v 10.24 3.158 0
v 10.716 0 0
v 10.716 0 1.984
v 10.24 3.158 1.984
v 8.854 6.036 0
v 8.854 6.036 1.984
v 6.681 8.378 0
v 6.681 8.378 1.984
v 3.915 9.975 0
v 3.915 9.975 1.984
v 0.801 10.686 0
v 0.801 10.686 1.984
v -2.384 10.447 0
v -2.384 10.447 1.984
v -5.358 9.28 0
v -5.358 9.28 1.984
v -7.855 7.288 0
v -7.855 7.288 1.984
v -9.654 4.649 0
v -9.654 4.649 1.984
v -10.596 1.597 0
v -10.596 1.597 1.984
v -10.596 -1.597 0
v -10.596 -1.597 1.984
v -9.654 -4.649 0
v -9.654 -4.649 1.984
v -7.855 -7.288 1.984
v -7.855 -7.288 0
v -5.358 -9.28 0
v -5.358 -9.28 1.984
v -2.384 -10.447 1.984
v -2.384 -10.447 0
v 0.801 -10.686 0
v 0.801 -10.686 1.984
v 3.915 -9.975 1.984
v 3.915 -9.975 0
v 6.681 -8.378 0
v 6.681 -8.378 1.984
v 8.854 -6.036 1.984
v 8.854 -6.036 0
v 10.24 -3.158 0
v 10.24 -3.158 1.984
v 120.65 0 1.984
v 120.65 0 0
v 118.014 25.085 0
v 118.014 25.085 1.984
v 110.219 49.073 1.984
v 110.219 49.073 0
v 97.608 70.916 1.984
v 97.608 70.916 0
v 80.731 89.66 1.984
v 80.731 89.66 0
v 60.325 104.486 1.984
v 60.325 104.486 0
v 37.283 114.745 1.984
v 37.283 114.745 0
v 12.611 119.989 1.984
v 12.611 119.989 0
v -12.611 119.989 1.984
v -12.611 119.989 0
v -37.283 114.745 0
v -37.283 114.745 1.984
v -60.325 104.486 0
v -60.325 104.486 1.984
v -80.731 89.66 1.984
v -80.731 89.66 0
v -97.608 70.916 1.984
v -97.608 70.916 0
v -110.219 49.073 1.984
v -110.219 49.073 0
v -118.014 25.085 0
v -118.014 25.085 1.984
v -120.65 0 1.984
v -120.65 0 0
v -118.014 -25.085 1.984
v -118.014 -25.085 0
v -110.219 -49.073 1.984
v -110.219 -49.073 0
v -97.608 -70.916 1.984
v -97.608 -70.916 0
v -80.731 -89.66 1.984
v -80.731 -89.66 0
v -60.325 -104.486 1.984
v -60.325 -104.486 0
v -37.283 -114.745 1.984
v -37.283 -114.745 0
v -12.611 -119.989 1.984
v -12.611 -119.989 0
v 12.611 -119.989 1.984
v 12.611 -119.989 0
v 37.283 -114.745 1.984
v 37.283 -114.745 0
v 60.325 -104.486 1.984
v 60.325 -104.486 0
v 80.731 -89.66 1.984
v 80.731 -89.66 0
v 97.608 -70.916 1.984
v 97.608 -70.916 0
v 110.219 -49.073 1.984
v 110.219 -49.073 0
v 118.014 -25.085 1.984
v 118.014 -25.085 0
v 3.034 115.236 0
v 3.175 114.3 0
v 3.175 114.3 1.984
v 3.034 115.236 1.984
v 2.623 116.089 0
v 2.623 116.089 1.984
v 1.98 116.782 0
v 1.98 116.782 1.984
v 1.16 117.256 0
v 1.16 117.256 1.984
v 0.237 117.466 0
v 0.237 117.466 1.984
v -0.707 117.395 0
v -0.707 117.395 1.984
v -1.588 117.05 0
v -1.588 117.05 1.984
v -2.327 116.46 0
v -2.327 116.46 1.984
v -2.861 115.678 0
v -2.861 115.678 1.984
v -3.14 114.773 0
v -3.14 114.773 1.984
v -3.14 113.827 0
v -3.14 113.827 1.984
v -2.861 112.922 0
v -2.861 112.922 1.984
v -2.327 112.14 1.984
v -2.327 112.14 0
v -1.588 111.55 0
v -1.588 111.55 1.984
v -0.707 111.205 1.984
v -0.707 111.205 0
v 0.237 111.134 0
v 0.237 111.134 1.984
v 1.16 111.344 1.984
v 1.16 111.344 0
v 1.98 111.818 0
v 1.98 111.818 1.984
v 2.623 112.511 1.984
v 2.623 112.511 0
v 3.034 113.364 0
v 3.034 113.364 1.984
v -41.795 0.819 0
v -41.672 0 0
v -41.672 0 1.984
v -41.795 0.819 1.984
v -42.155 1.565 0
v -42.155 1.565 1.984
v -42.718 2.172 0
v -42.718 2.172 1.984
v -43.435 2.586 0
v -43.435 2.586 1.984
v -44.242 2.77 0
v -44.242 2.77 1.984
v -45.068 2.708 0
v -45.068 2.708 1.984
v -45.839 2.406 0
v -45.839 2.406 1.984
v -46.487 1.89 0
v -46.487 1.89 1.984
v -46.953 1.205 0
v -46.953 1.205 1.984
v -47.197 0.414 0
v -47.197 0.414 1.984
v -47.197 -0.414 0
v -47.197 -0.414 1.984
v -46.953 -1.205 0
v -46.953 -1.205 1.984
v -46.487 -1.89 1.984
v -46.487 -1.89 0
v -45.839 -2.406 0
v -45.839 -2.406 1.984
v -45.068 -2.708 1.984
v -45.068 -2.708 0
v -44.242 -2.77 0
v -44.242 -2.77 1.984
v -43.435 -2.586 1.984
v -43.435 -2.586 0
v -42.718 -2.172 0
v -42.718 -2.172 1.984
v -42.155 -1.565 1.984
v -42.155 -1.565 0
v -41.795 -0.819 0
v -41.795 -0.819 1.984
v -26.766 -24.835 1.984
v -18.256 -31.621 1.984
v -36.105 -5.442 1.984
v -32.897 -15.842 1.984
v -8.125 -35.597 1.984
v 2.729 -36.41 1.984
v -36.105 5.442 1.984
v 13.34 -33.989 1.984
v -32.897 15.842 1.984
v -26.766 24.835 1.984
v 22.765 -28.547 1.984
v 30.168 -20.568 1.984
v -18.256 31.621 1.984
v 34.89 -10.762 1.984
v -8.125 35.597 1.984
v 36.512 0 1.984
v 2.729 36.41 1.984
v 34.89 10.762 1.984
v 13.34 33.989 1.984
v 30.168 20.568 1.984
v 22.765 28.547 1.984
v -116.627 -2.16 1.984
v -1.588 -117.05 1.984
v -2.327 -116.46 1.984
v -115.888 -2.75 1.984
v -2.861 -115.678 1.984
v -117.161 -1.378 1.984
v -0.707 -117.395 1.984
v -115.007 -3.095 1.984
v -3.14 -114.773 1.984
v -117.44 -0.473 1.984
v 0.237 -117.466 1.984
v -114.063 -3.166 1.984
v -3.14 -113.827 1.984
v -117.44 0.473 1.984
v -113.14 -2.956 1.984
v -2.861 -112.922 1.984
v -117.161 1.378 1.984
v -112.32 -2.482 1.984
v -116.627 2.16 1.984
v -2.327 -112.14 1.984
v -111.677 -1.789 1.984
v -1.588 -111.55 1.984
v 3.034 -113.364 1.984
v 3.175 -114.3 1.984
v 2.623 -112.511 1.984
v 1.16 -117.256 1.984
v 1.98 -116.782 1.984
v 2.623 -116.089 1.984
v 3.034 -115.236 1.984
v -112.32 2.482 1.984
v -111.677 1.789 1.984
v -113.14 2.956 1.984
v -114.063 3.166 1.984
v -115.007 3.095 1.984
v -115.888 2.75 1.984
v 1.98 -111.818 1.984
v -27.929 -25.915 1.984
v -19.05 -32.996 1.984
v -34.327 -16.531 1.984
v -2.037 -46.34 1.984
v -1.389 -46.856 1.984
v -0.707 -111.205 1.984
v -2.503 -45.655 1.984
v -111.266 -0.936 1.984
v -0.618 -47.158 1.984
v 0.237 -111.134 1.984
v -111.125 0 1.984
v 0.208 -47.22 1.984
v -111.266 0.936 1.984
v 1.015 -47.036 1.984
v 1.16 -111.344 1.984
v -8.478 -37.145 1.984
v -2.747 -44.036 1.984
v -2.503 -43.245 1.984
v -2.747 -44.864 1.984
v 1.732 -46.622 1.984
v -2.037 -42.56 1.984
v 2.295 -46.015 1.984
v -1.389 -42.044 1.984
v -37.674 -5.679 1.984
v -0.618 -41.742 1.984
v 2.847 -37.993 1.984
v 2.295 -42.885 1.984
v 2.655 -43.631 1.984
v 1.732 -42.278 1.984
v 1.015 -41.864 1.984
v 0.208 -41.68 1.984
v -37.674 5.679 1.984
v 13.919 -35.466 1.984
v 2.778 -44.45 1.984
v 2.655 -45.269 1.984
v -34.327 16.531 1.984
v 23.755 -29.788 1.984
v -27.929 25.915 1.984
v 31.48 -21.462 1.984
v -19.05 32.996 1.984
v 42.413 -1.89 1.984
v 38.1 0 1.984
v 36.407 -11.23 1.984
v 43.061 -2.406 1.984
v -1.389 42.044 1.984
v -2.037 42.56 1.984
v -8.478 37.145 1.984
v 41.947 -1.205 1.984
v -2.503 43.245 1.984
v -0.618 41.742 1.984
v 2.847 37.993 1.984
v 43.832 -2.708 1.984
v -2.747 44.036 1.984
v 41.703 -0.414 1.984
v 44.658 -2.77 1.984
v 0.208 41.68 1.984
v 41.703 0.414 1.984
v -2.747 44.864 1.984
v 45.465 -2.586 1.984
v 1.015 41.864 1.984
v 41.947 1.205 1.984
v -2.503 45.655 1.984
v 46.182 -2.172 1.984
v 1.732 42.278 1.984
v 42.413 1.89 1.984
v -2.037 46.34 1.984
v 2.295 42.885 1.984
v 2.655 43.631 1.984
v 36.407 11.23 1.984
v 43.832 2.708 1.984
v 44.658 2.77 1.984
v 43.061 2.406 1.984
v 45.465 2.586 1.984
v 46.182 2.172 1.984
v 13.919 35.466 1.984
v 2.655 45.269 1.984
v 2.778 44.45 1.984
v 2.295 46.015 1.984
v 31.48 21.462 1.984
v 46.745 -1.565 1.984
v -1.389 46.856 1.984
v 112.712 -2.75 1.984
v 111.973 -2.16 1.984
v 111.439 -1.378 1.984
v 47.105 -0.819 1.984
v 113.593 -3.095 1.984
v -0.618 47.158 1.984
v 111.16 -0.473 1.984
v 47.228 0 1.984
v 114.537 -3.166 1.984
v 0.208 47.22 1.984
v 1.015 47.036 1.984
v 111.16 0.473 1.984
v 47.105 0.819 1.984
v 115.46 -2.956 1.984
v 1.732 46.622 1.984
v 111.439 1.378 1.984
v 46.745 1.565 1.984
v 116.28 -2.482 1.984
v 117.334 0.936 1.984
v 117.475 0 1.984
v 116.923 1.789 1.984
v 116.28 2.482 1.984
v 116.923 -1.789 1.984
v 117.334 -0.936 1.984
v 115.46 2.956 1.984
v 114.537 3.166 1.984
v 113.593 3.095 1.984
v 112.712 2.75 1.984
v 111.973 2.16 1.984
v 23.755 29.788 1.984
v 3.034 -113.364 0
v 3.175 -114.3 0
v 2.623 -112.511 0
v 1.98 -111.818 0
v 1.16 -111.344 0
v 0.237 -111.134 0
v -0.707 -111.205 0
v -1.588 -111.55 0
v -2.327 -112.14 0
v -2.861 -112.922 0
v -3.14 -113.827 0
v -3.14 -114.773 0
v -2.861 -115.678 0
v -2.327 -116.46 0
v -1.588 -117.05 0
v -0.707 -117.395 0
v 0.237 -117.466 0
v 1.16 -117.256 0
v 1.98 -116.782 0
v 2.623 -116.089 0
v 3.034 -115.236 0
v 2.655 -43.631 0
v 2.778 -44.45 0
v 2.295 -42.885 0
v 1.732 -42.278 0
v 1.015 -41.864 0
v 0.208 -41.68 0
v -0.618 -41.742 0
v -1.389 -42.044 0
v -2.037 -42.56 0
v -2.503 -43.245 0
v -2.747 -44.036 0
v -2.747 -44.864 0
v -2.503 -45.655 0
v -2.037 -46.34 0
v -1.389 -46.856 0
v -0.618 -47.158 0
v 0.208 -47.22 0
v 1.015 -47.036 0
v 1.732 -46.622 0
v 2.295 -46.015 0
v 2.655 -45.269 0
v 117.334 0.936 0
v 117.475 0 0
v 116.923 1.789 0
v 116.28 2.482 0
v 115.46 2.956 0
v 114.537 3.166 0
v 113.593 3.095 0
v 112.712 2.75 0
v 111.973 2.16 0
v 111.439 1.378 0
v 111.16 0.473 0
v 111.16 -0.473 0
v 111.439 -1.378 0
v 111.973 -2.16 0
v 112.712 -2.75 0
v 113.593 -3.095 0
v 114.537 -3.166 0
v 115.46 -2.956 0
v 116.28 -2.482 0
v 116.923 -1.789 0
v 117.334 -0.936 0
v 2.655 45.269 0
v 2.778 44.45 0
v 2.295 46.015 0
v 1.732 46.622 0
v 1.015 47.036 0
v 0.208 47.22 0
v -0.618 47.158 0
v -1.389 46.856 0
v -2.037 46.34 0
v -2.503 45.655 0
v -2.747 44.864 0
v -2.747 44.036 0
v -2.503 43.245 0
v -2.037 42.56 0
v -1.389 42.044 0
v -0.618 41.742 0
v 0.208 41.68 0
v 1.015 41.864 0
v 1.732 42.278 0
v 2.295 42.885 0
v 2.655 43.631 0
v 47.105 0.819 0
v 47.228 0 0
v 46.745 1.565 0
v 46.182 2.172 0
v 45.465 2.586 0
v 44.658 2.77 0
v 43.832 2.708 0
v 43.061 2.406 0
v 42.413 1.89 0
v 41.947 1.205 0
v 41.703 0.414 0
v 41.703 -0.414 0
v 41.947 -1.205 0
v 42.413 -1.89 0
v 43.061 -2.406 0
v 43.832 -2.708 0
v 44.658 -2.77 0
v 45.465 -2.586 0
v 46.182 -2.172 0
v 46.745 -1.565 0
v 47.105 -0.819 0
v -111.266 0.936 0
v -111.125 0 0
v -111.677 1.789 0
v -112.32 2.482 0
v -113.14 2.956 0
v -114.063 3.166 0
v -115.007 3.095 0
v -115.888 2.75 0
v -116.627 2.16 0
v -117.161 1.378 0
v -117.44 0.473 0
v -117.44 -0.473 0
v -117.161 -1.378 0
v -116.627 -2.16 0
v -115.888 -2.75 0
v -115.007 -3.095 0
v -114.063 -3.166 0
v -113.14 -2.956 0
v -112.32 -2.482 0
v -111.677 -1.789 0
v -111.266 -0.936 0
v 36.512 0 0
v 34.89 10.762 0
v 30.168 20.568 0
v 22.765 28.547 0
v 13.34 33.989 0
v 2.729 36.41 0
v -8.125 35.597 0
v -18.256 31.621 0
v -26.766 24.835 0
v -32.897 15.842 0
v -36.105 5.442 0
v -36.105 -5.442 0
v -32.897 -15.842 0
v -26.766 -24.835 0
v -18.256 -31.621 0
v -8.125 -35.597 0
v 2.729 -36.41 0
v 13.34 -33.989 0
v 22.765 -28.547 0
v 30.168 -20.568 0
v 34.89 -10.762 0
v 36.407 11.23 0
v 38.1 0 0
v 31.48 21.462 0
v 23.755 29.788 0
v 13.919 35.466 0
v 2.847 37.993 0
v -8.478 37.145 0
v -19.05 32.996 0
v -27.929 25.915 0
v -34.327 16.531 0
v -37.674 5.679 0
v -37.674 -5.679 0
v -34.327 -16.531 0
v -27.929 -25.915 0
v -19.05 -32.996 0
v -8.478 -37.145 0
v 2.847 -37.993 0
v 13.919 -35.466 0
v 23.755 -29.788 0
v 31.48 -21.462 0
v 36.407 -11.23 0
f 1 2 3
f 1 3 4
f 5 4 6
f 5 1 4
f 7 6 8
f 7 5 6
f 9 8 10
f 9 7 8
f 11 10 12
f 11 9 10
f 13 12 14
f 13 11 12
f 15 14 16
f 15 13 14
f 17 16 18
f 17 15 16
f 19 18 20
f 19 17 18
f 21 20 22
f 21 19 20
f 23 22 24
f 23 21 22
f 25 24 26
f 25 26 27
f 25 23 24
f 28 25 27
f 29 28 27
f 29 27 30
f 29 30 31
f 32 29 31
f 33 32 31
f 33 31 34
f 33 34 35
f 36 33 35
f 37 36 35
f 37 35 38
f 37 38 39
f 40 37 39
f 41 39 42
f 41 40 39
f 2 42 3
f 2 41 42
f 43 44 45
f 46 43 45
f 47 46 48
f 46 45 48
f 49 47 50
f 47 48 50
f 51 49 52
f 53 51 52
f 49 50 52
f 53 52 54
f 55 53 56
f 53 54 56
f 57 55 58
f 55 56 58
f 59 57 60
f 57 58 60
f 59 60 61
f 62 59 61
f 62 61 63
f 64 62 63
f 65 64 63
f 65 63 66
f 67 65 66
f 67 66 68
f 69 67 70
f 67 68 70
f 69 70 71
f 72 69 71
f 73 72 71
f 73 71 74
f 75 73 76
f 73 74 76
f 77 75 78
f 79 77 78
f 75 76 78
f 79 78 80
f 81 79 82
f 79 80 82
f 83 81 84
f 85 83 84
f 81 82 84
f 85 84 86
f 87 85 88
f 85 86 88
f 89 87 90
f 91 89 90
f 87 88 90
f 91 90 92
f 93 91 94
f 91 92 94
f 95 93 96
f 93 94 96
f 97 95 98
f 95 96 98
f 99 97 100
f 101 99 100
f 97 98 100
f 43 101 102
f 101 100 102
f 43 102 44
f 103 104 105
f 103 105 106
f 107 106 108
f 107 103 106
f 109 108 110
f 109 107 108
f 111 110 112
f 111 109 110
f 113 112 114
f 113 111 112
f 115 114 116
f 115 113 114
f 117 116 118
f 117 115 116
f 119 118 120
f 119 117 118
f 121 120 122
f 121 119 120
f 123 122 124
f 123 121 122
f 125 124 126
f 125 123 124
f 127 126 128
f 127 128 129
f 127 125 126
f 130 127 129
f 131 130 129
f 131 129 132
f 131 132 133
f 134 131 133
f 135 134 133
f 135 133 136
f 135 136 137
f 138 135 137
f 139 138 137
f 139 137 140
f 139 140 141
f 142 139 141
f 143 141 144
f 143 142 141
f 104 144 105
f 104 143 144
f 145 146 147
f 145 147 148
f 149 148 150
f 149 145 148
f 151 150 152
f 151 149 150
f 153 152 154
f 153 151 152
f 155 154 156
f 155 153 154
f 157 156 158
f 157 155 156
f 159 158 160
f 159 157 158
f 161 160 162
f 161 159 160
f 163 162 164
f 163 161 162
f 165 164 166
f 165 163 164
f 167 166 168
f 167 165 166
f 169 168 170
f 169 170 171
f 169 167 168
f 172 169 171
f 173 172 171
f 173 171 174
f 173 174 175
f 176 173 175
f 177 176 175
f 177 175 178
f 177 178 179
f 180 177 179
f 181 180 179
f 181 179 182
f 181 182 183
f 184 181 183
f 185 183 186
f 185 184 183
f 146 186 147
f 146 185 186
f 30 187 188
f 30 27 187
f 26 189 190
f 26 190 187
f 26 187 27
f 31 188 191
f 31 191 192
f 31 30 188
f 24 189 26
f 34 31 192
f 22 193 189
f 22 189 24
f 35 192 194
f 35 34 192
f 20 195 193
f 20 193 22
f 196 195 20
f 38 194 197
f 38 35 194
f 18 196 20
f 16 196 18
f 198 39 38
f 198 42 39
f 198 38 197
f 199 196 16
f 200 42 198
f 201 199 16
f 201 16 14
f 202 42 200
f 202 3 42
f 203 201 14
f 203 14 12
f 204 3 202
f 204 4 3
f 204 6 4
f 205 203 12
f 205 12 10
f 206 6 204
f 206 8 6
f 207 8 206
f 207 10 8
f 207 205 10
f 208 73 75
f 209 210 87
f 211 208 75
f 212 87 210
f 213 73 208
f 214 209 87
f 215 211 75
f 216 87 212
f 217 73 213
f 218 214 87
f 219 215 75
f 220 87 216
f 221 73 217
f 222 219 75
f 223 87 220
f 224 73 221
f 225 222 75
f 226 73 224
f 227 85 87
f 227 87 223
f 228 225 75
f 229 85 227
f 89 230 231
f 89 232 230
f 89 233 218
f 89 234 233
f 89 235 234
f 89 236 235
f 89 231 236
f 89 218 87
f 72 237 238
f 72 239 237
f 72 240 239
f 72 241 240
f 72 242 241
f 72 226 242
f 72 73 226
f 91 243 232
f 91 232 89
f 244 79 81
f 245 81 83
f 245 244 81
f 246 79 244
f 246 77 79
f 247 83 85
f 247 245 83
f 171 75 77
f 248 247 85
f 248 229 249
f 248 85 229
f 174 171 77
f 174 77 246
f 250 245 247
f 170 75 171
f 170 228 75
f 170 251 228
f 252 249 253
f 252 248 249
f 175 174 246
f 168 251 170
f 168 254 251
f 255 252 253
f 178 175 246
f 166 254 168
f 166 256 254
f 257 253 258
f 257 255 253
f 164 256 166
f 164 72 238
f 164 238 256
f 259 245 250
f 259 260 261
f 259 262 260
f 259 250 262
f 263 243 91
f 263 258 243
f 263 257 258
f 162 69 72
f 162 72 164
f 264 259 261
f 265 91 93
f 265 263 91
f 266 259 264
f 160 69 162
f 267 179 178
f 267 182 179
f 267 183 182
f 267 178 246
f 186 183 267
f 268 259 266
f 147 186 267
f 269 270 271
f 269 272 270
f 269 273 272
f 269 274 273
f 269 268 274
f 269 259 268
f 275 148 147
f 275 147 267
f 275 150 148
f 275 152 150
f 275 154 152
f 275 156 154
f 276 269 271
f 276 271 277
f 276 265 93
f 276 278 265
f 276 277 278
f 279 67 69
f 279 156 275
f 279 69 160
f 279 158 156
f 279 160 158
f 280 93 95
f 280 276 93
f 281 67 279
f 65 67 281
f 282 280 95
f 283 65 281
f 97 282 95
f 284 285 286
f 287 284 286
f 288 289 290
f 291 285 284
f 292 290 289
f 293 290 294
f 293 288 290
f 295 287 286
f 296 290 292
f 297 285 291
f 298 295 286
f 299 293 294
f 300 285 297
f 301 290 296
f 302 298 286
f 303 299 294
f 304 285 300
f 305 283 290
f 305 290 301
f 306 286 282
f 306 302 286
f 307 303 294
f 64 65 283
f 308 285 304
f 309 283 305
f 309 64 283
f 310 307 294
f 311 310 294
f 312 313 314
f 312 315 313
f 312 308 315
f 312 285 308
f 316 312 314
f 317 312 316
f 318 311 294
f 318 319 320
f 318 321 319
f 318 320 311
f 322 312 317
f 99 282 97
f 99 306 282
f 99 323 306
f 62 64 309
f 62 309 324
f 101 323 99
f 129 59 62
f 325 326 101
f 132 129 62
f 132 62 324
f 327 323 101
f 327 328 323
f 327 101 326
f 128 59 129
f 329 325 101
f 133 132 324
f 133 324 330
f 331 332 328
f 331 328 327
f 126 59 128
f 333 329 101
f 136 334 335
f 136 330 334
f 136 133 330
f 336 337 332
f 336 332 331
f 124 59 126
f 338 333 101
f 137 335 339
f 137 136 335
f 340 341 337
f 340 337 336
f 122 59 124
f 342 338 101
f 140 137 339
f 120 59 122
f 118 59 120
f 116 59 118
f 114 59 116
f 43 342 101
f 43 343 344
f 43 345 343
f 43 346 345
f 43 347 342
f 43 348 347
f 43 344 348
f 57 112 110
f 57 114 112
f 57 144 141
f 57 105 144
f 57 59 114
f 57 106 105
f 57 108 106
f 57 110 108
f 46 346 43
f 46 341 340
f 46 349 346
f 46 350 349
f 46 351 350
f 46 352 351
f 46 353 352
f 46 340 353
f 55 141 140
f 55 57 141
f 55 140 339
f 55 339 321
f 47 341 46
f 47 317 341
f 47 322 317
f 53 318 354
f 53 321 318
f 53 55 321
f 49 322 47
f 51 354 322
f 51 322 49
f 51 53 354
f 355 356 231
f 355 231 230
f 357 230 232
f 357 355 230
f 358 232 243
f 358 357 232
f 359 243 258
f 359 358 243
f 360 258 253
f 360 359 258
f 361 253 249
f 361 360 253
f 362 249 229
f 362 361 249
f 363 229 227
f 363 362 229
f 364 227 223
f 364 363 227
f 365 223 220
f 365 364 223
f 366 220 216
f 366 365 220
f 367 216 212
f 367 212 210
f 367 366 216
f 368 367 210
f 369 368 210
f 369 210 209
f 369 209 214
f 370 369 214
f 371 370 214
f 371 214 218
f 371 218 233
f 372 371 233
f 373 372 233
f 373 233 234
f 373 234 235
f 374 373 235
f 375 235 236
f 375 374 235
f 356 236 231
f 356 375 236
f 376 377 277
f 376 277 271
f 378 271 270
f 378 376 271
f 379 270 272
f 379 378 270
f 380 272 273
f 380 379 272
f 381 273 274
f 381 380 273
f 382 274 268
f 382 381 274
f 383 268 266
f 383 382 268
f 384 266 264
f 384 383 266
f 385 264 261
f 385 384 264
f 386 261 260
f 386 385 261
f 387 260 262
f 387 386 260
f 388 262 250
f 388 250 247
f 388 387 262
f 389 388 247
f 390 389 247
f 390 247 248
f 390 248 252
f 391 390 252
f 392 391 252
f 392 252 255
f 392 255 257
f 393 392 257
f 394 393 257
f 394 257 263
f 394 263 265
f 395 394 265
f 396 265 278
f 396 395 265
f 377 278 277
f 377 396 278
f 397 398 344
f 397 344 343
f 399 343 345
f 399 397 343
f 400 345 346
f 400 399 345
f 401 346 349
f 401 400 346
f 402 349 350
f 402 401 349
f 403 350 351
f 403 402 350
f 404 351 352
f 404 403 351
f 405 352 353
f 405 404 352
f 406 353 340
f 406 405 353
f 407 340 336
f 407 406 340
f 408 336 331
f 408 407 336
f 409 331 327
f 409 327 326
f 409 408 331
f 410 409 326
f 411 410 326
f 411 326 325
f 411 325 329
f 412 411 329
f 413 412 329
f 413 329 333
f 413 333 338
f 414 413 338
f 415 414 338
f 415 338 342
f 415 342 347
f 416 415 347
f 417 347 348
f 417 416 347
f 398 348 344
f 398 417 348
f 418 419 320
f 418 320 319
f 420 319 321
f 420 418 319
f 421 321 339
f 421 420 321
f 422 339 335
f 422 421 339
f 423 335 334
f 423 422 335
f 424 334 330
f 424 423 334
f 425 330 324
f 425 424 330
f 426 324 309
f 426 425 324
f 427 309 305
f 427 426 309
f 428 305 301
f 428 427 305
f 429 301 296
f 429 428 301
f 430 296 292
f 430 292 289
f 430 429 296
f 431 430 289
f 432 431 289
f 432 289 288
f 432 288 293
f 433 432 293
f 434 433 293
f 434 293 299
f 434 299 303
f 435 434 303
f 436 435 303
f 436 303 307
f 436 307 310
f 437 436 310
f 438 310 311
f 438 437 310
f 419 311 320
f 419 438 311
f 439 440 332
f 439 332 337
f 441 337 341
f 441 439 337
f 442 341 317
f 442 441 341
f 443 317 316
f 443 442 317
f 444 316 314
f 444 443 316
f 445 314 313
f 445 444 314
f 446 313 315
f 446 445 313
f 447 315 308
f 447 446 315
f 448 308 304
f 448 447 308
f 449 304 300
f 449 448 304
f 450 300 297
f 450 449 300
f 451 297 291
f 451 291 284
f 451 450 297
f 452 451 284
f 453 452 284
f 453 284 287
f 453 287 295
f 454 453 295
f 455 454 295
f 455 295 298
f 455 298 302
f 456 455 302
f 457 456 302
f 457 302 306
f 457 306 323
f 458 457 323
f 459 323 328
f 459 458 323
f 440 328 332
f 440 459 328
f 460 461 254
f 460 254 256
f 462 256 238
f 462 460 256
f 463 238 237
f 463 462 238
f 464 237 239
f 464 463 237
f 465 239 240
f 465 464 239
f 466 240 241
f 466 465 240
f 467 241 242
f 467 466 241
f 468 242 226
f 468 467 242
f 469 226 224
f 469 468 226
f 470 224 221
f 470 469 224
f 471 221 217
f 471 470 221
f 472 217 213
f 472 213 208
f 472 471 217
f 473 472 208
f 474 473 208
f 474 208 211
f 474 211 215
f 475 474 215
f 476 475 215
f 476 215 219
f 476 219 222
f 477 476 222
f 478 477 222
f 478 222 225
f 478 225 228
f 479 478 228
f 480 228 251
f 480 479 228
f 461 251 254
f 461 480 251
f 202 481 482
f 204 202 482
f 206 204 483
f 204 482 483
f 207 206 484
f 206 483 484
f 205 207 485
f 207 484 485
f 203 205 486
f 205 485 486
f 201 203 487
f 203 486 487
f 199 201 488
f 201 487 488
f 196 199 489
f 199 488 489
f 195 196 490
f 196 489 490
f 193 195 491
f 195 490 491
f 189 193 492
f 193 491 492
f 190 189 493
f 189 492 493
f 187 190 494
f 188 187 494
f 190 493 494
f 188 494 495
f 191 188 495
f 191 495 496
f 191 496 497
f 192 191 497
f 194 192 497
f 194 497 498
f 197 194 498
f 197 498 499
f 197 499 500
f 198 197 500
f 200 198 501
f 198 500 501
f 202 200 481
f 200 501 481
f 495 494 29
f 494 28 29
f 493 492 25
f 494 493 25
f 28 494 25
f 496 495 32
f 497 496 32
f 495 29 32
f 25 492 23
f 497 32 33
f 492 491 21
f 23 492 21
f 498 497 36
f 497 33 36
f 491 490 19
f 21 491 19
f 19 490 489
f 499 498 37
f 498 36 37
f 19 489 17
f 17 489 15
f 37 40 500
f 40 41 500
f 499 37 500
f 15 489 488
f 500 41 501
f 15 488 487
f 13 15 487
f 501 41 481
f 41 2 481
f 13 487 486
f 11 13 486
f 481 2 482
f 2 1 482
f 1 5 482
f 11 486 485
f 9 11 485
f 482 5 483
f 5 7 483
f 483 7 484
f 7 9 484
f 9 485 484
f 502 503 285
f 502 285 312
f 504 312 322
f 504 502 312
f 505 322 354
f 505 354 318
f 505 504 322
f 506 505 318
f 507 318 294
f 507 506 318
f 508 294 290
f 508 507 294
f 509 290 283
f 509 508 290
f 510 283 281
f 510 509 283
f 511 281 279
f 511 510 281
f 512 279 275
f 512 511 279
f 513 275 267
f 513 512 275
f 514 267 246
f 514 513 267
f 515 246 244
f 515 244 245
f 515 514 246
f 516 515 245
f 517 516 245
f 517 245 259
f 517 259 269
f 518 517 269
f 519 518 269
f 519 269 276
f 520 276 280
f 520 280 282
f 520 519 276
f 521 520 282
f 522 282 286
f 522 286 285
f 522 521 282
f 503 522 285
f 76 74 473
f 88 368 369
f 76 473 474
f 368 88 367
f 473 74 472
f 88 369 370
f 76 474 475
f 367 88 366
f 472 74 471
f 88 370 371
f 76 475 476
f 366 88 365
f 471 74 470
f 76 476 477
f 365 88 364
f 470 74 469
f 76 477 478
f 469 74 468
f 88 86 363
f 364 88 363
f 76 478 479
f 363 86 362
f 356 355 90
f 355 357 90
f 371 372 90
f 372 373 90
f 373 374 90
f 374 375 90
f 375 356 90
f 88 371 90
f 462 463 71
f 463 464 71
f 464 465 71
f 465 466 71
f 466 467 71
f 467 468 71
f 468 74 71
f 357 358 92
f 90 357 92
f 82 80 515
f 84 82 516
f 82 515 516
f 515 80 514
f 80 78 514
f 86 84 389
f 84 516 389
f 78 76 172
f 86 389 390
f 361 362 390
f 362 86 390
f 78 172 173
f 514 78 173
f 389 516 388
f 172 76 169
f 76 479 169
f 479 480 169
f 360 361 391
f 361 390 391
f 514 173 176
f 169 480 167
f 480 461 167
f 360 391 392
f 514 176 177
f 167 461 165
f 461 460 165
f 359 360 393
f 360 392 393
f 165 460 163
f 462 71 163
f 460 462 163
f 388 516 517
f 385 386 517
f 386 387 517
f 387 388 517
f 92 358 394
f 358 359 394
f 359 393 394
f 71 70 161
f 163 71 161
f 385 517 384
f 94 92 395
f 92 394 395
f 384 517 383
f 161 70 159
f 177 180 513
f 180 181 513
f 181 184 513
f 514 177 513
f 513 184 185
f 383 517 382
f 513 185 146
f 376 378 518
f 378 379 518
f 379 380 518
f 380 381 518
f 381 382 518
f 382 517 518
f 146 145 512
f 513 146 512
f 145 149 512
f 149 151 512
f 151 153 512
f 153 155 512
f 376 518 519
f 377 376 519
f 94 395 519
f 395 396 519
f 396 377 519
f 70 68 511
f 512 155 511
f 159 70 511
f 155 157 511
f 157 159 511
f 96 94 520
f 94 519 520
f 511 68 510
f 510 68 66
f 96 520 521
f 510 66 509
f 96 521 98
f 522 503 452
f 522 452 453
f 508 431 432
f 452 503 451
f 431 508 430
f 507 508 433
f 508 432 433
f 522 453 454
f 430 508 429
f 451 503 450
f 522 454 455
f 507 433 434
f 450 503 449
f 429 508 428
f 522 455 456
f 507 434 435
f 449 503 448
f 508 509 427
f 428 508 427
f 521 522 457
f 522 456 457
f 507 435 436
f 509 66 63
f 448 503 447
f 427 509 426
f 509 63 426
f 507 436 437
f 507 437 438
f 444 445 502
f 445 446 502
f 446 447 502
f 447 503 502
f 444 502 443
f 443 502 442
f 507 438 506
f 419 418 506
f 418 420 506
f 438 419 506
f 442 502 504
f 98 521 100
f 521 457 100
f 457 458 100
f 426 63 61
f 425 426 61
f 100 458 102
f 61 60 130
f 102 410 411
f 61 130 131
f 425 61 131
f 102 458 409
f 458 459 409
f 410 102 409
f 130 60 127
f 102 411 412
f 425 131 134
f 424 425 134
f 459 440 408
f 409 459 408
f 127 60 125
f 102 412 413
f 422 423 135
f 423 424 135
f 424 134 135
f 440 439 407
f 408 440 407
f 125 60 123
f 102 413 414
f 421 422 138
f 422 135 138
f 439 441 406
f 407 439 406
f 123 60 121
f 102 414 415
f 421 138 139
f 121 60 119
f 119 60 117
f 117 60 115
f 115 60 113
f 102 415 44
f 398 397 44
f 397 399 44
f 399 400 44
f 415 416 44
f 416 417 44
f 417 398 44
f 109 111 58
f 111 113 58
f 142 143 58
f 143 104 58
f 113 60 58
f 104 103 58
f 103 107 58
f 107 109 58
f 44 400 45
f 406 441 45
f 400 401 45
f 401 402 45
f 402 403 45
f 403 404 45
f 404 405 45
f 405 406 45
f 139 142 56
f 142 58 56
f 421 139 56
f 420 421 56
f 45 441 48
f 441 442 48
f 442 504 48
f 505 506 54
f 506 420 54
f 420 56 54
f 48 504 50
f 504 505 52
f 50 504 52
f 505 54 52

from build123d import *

# Parameters (mm, degrees)
F0_R     = 120.65
F0_R_2   = 3.175
F0_R_3   = 2.778125
F0_R_4   = 38.1
F0_R_5   = 36.5125
F0_R_6   = 10.715625
F1_DEPTH = 1.98374


with BuildPart() as f1:
    # F0 (on Top) → F1 (new body)
    with BuildSketch(Plane.XY):
        Circle(F0_R)
        with Locations((0, -114.3)):
            Circle(F0_R_2, mode=Mode.SUBTRACT)
        with Locations((0, -44.45)):
            Circle(F0_R_3, mode=Mode.SUBTRACT)
        with Locations((-114.3, 0)):
            Circle(F0_R_2, mode=Mode.SUBTRACT)
        with Locations((-44.45, 0)):
            Circle(F0_R_3, mode=Mode.SUBTRACT)
        Circle(F0_R_4, mode=Mode.SUBTRACT)
        with Locations((44.45, 0)):
            Circle(F0_R_3, mode=Mode.SUBTRACT)
        with Locations((0, 44.45)):
            Circle(F0_R_3, mode=Mode.SUBTRACT)
        with Locations((114.3, 0)):
            Circle(F0_R_2, mode=Mode.SUBTRACT)
        with Locations((0, 114.3)):
            Circle(F0_R_2, mode=Mode.SUBTRACT)
        Circle(F0_R_5)
        Circle(F0_R_6, mode=Mode.SUBTRACT)
    extrude(amount=F1_DEPTH)


solid = f1.part
